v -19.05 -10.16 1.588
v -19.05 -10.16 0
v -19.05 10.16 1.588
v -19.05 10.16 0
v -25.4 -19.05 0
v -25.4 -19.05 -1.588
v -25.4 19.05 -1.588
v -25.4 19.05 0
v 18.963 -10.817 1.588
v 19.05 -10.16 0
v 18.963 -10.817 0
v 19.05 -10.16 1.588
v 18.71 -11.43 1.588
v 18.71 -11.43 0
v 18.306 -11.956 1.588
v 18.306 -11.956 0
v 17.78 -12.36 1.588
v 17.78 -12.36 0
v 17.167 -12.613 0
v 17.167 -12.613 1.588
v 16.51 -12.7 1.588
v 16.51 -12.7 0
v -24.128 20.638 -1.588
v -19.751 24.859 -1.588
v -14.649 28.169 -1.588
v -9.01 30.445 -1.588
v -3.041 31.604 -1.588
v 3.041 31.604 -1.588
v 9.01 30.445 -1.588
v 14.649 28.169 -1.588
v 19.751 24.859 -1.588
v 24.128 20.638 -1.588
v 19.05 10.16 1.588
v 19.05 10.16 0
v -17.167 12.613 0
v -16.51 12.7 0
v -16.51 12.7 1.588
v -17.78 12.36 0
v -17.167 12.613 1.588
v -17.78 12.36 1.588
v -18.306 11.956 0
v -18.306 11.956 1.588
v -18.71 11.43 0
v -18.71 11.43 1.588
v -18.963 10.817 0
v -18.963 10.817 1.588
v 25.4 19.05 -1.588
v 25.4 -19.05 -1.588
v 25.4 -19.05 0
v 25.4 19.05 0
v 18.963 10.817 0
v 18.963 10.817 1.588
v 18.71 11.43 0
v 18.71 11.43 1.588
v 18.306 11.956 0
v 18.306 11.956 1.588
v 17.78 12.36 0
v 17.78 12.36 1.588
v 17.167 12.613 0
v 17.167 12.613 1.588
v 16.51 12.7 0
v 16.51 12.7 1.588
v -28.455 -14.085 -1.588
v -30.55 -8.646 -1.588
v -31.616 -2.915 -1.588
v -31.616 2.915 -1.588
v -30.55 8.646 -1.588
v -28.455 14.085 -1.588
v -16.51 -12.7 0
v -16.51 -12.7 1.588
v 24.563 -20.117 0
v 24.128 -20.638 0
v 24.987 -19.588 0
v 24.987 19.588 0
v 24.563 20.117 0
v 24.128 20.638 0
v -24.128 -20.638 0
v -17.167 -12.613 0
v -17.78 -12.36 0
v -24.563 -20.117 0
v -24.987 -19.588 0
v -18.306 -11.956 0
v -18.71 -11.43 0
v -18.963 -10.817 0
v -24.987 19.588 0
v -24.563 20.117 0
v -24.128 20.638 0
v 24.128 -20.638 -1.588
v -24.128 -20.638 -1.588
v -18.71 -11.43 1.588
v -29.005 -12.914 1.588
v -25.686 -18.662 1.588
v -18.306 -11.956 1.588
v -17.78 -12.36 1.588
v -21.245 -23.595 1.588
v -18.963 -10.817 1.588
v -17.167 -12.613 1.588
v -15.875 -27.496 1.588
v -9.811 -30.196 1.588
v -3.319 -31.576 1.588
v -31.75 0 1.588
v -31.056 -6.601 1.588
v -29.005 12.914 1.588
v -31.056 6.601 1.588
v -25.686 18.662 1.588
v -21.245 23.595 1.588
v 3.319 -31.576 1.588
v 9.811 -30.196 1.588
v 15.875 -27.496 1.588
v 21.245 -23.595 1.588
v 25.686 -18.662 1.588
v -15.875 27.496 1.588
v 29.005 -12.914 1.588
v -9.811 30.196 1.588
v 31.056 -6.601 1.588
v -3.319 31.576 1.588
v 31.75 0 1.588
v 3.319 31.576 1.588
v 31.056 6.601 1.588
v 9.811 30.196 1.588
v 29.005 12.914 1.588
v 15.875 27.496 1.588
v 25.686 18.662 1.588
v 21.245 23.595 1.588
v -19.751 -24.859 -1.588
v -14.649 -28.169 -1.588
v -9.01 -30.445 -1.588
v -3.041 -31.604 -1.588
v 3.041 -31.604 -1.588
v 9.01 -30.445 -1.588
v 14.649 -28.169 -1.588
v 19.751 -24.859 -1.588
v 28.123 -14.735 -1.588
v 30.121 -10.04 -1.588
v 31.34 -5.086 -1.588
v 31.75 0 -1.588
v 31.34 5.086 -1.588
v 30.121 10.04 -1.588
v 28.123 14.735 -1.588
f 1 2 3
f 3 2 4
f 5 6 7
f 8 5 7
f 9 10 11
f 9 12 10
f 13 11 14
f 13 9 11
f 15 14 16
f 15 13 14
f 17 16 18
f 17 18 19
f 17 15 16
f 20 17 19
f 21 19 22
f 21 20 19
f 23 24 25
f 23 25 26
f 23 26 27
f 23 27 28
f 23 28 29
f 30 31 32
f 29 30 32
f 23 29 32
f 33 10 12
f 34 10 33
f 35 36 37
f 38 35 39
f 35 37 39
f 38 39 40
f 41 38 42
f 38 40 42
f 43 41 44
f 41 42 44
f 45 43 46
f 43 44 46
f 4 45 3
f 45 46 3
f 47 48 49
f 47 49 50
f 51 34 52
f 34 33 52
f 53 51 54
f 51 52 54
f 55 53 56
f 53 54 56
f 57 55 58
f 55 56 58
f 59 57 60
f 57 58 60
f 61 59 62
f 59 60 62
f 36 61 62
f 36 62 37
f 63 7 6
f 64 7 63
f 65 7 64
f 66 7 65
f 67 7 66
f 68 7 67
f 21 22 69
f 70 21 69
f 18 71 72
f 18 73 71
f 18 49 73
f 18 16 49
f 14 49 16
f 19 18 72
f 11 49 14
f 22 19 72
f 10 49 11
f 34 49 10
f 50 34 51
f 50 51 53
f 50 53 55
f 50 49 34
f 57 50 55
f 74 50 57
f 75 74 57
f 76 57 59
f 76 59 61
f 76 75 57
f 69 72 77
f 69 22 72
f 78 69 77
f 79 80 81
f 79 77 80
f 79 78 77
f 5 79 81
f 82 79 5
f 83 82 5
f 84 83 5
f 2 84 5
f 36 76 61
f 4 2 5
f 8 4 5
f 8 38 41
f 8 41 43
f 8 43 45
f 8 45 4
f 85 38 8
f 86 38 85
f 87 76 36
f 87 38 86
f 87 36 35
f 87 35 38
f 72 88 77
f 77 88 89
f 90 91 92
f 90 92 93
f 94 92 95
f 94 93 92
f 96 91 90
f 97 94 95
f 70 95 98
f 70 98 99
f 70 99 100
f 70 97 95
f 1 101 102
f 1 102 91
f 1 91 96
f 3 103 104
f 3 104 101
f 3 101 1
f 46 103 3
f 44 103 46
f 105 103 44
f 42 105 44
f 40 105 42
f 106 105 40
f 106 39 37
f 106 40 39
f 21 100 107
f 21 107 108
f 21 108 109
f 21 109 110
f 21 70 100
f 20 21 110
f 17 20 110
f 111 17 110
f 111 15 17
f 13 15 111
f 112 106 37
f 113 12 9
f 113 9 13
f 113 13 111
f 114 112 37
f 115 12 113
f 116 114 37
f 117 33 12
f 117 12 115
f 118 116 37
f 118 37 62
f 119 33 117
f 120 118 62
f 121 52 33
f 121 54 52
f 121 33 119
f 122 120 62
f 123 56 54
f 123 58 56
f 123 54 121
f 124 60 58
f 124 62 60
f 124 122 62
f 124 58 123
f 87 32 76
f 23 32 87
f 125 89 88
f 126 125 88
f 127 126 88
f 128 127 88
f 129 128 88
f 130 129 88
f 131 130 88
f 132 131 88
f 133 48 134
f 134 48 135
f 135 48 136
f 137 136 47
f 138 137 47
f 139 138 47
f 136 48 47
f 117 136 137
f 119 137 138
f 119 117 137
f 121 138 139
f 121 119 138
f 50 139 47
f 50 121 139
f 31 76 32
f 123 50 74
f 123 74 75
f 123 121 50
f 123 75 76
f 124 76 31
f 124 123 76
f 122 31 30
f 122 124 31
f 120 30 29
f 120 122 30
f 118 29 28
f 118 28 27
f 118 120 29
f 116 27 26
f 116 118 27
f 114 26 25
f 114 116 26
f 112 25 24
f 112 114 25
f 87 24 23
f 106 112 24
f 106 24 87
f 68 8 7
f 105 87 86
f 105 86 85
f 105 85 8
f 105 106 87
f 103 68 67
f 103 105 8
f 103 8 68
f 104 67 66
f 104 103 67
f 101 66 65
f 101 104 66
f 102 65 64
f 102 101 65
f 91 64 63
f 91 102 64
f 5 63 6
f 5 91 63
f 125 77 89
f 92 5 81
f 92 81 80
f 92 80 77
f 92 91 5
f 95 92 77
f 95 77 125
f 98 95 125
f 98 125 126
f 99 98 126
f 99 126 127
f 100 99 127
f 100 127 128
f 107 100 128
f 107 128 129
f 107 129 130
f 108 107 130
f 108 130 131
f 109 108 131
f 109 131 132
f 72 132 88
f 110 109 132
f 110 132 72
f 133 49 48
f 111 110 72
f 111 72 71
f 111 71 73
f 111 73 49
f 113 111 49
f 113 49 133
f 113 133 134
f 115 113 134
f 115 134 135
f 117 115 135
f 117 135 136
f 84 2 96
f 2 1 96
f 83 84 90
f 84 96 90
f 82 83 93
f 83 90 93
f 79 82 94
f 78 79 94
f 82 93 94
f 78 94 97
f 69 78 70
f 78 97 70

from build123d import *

# Parameters (mm, degrees)
SKETCH1_R           = 31.75
BOSS_EXTRUDE1_DEPTH = 1.5875
SKETCH3_W           = 50.8
SKETCH3_H           = 41.275
CUT_EXTRUDE1_DEPTH  = 1.5875
CUT_EXTRUDE2_REACH  = 3.587
SKETCH4_W           = 38.1
SKETCH4_H           = 25.4
FILLET3_R           = 2.54


with BuildPart() as part:
    # Sketch1 → Boss-Extrude1 (new body, symmetric)
    with BuildSketch(Plane.XY):
        Circle(SKETCH1_R)
    extrude(amount=BOSS_EXTRUDE1_DEPTH, both=True)

    # Sketch3 → Cut-Extrude1 (cut)
    with BuildSketch(Plane(origin=(0, 0, -1.5875), x_dir=(-1, 0, 0), z_dir=(0, 0, -1))):
        Rectangle(SKETCH3_W, SKETCH3_H)
    extrude(amount=-CUT_EXTRUDE1_DEPTH, mode=Mode.SUBTRACT)

    # Sketch4 → Cut-Extrude2 (cut, up to next)
    with BuildSketch(Plane(origin=(0, 0, 0), x_dir=(-1, 0, 0), z_dir=(0, 0, -1)), mode=Mode.PRIVATE) as cut_extrude2_sk1:
        Rectangle(SKETCH4_W, SKETCH4_H)
    cut_extrude2_tool1 = extrude(cut_extrude2_sk1.sketch, amount=-CUT_EXTRUDE2_REACH, mode=Mode.PRIVATE) & part.part
    add(cut_extrude2_tool1.solids().sort_by_distance((0, 0, 0))[0], mode=Mode.SUBTRACT)

    # Fillet3
    fillet3_edges = [part.edges().sort_by_distance(p)[0] for p in [
        (-19.05, 12.7, 0.79375),
        (-19.05, -12.7, 0.79375),
        (19.05, -12.7, 0.79375),
        (19.05, 12.7, 0.79375),
    ]]
    fillet(fillet3_edges, radius=FILLET3_R)


solid = part.part
